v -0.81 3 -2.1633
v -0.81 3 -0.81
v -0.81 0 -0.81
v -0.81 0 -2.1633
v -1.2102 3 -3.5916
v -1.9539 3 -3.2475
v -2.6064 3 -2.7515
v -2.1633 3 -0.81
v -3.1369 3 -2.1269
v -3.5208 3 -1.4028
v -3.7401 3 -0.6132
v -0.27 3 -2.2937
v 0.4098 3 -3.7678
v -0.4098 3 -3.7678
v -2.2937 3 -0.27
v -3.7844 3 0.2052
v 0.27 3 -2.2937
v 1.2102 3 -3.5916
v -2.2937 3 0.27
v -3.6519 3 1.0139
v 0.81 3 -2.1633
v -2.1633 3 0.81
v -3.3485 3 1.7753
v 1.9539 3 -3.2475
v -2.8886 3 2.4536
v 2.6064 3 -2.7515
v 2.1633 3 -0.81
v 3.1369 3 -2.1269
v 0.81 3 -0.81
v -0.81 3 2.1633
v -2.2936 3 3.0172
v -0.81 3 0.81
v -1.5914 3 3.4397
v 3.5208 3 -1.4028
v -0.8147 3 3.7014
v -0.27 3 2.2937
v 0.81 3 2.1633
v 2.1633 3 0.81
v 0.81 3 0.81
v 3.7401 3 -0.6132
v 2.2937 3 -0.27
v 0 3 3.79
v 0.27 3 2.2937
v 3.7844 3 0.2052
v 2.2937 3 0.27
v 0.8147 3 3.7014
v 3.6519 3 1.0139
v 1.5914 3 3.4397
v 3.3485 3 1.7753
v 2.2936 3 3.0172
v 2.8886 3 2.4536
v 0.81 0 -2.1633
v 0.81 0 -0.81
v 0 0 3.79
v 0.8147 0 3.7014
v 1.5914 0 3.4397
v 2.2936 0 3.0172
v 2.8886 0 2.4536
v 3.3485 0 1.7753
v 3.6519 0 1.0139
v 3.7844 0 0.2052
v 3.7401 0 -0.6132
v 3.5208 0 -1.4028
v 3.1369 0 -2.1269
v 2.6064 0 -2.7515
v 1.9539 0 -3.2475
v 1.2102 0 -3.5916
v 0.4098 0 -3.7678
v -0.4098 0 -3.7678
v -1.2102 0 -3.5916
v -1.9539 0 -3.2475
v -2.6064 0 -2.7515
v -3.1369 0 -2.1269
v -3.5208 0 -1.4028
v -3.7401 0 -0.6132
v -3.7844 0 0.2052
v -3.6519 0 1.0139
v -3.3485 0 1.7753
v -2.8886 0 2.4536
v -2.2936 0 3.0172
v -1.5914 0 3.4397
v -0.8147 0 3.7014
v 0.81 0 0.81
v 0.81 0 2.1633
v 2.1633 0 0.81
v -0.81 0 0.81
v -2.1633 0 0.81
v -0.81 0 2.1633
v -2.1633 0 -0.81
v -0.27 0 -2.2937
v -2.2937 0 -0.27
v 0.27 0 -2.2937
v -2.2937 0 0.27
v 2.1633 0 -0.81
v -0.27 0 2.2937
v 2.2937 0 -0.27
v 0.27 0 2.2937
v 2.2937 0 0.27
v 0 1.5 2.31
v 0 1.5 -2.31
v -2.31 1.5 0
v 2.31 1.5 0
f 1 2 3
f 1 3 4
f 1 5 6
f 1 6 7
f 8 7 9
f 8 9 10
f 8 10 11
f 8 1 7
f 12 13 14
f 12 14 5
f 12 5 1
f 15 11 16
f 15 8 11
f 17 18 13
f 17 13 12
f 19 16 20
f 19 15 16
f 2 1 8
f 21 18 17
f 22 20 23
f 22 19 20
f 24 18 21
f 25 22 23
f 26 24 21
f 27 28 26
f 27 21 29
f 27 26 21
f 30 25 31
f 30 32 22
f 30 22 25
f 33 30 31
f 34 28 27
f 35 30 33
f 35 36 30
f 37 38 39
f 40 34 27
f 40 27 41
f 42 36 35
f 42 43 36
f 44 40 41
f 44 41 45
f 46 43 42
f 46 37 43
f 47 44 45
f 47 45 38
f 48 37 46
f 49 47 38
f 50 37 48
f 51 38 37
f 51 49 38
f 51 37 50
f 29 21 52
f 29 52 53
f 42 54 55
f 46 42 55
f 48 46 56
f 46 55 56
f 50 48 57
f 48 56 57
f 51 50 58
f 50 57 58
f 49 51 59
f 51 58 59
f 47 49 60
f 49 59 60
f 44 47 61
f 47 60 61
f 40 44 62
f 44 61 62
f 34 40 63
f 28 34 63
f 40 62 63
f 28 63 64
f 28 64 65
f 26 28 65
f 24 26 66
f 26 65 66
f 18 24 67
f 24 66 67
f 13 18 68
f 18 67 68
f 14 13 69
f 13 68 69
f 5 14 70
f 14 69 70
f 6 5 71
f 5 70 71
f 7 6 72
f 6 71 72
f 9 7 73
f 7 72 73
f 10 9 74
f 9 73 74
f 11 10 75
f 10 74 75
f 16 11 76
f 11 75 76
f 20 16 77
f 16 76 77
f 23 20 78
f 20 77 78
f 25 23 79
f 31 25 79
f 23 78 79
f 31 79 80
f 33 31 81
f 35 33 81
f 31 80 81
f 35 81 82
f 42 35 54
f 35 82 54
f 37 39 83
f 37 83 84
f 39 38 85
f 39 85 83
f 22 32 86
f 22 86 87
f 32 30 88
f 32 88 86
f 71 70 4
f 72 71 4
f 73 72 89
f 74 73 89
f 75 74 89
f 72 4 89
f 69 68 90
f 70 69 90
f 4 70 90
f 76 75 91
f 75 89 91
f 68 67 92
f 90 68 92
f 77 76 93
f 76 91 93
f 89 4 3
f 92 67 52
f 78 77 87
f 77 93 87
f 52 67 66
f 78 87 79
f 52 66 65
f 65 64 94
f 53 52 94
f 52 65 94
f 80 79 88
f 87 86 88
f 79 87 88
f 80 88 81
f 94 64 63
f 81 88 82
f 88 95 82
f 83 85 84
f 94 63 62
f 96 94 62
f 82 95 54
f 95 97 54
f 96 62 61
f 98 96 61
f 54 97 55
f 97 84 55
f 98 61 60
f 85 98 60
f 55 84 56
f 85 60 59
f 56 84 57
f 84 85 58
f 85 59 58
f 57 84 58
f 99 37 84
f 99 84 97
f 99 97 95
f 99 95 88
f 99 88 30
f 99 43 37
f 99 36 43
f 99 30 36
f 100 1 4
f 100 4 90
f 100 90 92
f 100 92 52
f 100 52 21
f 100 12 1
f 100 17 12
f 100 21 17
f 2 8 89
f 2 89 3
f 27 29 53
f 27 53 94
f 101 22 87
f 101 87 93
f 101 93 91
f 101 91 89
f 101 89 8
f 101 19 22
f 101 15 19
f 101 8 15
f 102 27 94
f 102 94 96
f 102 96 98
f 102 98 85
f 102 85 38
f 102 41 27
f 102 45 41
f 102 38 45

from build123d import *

# Parameters (mm, degrees)
SKETCH1_R           = 3.79
BOSS_EXTRUDE1_DEPTH = 3
CUT_EXTRUDE1_DEPTH  = 3


with BuildPart() as part:
    # Sketch1 → Boss-Extrude1 (new body)
    with BuildSketch(Plane(origin=(0, 0, 0), x_dir=(1, 0, 0), z_dir=(0, 1, 0))):
        with Locations(Location((0, 0, 0), (0, 0, 270))):
            Circle(SKETCH1_R)
    extrude(amount=BOSS_EXTRUDE1_DEPTH)

    # Sketch2 → Cut-Extrude1 (cut)
    with BuildSketch(Plane(origin=(0, 3, 0), x_dir=(1, 0, 0), z_dir=(0, 1, 0))):
        with BuildLine():
            Line((-2.163330765, 0.81), (-0.81, 0.81))
            Line((-0.81, 0.81), (-0.81, 2.163330765))
            add(Edge.make_bspline(
                [(-0.81, 2.163330765), (0, 2.456669235), (0.81, 2.163330765)],
                knots=[0, 0, 0, 1, 1, 1], degree=2))
            Line((0.81, 2.163330765), (0.81, 0.81))
            Line((0.81, 0.81), (2.163330765, 0.81))
            add(Edge.make_bspline(
                [(2.163330765, 0.81), (2.456669235, 0), (2.163330765, -0.81)],
                knots=[0, 0, 0, 1, 1, 1], degree=2))
            Line((2.163330765, -0.81), (0.81, -0.81))
            Line((0.81, -0.81), (0.81, -2.163330765))
            add(Edge.make_bspline(
                [(0.81, -2.163330765), (0, -2.456669235), (-0.81, -2.163330765)],
                knots=[0, 0, 0, 1, 1, 1], degree=2))
            Line((-0.81, -2.163330765), (-0.81, -0.81))
            Line((-0.81, -0.81), (-2.163330765, -0.81))
            add(Edge.make_bspline(
                [(-2.163330765, -0.81), (-2.456669235, 0), (-2.163330765, 0.81)],
                knots=[0, 0, 0, 1, 1, 1], degree=2))
        make_face()
    extrude(amount=-CUT_EXTRUDE1_DEPTH, mode=Mode.SUBTRACT)


solid = part.part
